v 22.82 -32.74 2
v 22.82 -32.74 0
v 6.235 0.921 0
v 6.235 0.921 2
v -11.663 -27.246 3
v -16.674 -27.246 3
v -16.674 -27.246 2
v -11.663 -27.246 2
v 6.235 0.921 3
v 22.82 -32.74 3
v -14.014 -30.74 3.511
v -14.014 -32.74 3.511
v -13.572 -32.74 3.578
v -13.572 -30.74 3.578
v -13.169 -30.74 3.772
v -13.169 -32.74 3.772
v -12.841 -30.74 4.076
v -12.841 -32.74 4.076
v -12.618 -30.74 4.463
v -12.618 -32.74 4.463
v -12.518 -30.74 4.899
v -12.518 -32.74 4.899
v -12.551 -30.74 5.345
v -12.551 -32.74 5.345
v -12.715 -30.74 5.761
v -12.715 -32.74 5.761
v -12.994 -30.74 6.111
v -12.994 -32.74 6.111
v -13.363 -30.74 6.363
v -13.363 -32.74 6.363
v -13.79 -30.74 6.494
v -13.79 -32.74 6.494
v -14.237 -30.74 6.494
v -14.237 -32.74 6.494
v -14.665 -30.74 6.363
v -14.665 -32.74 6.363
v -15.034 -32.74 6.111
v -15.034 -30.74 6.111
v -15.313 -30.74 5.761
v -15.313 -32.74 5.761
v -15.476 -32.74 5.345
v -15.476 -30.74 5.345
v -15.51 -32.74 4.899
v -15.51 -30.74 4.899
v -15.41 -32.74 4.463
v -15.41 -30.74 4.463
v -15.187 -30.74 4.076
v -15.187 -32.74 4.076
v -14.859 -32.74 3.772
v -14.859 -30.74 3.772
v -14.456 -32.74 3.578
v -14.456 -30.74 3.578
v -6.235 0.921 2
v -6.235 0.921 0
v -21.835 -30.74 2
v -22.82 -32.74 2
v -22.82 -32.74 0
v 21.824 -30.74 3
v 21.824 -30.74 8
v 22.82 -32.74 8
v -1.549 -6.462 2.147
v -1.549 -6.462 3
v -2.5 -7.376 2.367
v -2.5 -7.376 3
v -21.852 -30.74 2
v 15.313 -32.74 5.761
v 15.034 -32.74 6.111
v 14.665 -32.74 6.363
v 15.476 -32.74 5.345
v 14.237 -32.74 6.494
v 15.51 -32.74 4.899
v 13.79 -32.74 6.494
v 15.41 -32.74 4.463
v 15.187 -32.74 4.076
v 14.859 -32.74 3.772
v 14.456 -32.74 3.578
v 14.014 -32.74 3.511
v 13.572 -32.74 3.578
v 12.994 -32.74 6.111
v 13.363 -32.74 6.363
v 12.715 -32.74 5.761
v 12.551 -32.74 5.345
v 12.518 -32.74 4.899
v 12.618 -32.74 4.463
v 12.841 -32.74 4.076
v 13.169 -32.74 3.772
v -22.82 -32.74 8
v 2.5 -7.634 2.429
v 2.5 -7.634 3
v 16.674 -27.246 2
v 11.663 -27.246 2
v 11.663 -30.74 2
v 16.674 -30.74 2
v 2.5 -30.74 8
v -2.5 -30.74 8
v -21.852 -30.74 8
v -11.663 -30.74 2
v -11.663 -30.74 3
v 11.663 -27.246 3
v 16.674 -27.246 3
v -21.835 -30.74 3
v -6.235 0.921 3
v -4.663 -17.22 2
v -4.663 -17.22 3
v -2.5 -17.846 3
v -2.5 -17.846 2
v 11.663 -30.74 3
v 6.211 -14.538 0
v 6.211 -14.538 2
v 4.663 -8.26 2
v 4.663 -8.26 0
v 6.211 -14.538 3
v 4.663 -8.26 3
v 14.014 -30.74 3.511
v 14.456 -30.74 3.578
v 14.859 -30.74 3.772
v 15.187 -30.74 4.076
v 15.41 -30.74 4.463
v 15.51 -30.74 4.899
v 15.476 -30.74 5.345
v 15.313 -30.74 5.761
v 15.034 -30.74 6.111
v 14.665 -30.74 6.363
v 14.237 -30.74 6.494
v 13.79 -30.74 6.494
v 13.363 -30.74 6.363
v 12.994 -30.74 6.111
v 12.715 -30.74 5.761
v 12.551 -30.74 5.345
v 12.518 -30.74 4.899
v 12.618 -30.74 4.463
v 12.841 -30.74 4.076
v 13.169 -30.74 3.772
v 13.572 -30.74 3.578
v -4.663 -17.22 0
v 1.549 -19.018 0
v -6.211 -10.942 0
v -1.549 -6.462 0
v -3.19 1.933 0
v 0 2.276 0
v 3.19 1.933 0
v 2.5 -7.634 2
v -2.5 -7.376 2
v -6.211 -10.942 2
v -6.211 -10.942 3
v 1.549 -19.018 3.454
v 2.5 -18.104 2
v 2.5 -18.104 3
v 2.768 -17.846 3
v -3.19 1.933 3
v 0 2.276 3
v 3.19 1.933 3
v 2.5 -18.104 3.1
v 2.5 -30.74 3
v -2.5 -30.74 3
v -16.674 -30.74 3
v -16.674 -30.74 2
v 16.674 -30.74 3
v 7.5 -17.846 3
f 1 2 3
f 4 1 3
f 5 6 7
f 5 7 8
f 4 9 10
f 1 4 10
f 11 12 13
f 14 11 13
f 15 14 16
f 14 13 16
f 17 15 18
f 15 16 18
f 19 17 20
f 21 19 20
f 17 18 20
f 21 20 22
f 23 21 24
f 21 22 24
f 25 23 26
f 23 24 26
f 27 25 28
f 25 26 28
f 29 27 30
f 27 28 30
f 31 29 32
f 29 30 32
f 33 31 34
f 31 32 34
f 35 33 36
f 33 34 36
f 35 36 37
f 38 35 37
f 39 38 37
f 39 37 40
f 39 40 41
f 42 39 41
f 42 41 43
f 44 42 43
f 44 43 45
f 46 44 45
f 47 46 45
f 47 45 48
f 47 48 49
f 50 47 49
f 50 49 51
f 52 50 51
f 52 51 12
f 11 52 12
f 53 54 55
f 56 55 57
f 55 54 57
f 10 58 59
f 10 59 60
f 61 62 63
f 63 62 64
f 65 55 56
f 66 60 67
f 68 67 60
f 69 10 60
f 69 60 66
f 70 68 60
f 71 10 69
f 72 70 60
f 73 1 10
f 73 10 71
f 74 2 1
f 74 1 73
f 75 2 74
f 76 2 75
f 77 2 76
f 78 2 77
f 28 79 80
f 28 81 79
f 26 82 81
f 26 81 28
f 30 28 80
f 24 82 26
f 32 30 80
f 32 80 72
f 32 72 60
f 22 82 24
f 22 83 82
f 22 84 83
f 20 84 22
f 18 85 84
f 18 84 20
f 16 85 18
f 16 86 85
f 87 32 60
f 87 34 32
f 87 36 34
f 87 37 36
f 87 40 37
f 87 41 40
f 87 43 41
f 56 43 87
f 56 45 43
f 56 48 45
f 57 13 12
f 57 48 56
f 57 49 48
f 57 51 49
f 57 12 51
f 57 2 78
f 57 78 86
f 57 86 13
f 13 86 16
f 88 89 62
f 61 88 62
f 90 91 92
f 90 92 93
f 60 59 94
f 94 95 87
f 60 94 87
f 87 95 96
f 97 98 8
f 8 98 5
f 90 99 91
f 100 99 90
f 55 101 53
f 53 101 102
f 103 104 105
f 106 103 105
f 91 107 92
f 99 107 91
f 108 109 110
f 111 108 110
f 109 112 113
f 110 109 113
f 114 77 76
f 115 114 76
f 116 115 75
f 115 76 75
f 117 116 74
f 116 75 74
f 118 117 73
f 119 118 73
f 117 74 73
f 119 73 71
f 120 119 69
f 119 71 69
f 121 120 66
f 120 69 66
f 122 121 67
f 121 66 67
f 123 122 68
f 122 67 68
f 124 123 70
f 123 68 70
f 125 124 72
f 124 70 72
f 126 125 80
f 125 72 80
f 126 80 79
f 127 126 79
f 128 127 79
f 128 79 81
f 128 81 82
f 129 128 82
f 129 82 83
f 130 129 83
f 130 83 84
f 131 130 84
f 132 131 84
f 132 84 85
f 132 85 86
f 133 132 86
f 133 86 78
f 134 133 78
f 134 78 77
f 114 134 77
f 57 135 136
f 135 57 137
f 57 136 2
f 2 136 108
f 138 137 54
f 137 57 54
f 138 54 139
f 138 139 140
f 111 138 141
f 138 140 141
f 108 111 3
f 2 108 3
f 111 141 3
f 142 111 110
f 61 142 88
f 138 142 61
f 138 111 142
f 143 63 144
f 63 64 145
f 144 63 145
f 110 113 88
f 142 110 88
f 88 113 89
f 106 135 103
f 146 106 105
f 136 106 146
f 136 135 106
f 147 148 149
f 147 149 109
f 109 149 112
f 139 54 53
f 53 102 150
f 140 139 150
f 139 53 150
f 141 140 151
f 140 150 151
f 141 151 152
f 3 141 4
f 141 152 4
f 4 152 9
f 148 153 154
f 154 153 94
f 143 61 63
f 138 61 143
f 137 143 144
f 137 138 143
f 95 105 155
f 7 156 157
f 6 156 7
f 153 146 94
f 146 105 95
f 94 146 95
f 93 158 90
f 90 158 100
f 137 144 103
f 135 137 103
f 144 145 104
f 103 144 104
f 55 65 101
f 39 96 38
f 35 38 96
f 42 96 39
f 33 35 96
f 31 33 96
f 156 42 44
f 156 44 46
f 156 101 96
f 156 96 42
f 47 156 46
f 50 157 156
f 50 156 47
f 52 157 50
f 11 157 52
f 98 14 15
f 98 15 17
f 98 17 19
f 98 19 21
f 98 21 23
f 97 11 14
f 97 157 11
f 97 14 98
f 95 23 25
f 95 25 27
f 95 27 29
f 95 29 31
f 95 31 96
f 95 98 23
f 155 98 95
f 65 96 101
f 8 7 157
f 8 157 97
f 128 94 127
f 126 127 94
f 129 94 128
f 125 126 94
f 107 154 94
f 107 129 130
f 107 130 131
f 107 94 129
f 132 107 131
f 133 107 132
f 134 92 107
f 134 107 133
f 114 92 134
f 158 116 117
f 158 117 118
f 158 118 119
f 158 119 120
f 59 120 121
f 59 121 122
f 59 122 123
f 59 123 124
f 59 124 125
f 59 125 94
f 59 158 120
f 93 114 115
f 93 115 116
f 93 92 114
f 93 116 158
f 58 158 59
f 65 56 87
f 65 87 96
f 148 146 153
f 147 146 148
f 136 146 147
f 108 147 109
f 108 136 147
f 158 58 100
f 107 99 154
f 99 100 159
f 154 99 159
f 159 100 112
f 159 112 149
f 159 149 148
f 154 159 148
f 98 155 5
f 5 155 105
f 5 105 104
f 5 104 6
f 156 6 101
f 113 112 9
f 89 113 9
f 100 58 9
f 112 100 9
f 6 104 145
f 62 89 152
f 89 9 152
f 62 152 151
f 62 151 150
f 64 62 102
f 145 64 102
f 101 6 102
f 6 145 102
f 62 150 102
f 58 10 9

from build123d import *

# Parameters (mm, degrees)
SKETCH_1_R               = 3
EXTRUDE_1_DEPTH          = 2
EXTRUDE_2_DEPTH          = 6
RIB_2_REACH              = 42.702
SKETCH_3_WALL_W          = 109.004825052
SKETCH_3_WALL_H          = 5
SKETCH_4_R               = 4.101413307
EXTRUDE_3_DEPTH          = 2
EXTRUDE_4_DEPTH          = 3
CUT_EXTRUDE_1_DEPTH      = 41.220101475
CUT_EXTRUDE_1_DEPTH_BACK = 41.220101475
CUT_EXTRUDE_START        = -10
CUT_EXTRUDE_2_DEPTH      = 10
CUT_EXTRUDE_3_DEPTH      = 10
SKETCH_14_R              = 1.5
CUT_EXTRUDE_4_DEPTH      = 10
SKETCH_15_W              = 5.01110436
SKETCH_15_H              = 3.494287521
CUT_EXTRUDE_5_DEPTH      = 1


with BuildPart() as part:
    # 草图1 → 凸台-拉伸1 (new body)
    with BuildSketch(Plane.XY):
        with BuildLine():
            Line((-5.382175267, 2.651827558), (-22.819924686, -32.74))
            Line((-22.819924686, -32.74), (22.819924686, -32.74))
            Line((22.819924686, -32.74), (5.382175267, 2.651827558))
            ThreePointArc((5.382175267, 2.651827558), (0, 6), (-5.382175267, 2.651827558))
        make_face()
        Circle(SKETCH_1_R, mode=Mode.SUBTRACT)
    extrude(amount=EXTRUDE_1_DEPTH)

    # 草图2 → 凸台-拉伸2 (add)
    with BuildSketch(Plane.XY.offset(2)):
        Polygon((21.824193002, -30.74), (22.819924686, -32.74), (-22.819924686, -32.74), (-21.851665672, -30.74), align=None)
    extrude(amount=EXTRUDE_2_DEPTH)

    # 草图3 wall → 筋2 (add, up to next)
    with BuildSketch(Plane(origin=(0, -18.296150966, 5), x_dir=(0, -0.972147881588, 0.234368292061), z_dir=(0, -0.234368292061, -0.972147881588)), mode=Mode.PRIVATE) as rib_2_sk1:
        Rectangle(SKETCH_3_WALL_W, SKETCH_3_WALL_H)
    rib_2_tool1 = extrude(rib_2_sk1.sketch, amount=RIB_2_REACH, mode=Mode.PRIVATE) - part.part
    add(rib_2_tool1.solids().sort_by_distance((0, -18.296150966, 5))[0])

    # 草图4 → 凸台-拉伸3 (add)
    with BuildSketch(Plane.XY.offset(2)):
        Circle(SKETCH_4_R)
    extrude(amount=-EXTRUDE_3_DEPTH)

    # 草图9 → 凸台-拉伸4 (add)
    with BuildSketch(Plane(origin=(0, 0, 0), x_dir=(-1, 0, 0), z_dir=(0, 0, -1))):
        with BuildLine():
            Line((-6.23517922, 0.920562354), (-22.819924686, -32.74))
            Line((-22.819924686, -32.74), (22.819924686, -32.74))
            Line((22.819924686, -32.74), (6.23517922, 0.920562354))
            ThreePointArc((6.23517922, 0.920562354), (0, 2.276271965), (-6.23517922, 0.920562354))
        make_face()
        Polygon((6.21139304, -10.94224311), (4.662599656, -17.220345721), (-1.548793384, -19.018102611), (-6.21139304, -14.53775689), (-4.662599656, -8.259654279), (1.548793384, -6.461897389), align=None, mode=Mode.SUBTRACT)
    extrude(amount=-EXTRUDE_4_DEPTH)

    # 草图11 → 切除-拉伸1 (cut, two sides: drawn at the far end of the back side and taken through both)
    with BuildSketch(Plane.XY.offset(3).offset(-CUT_EXTRUDE_1_DEPTH_BACK)):
        Polygon((6.21139304, -14.53775689), (4.662599656, -8.259654279), (-1.548793384, -6.461897389), (-6.21139304, -10.94224311), (-4.662599656, -17.220345721), (1.548793384, -19.018102611), align=None)
    extrude(amount=CUT_EXTRUDE_1_DEPTH + CUT_EXTRUDE_1_DEPTH_BACK, mode=Mode.SUBTRACT)

    # 草图12 → 切除-拉伸2 (cut)
    with BuildSketch(Plane.XY.offset(3).offset(CUT_EXTRUDE_START)):
        with BuildLine():
            Line((14.504971028, 2.702486536), (10.280667783, -1.794850678))
            ThreePointArc((10.280667783, -1.794850678), (0.290112641, 2.273469232), (-9.850153994, -1.405852921))
            Line((-9.850153994, -1.405852921), (-13.409584794, 3.662670837))
            ThreePointArc((-13.409584794, 3.662670837), (0.728324257, 8.43390183), (14.504971028, 2.702486536))
        make_face()
    extrude(amount=CUT_EXTRUDE_2_DEPTH, mode=Mode.SUBTRACT)

    # 草图13 → 切除-拉伸3 (cut)
    with BuildSketch(Plane.ZY.offset(2.5)):
        Polygon((3, -17.846264642), (8, -30.74), (8, -17.846264642), (3.4065387, -17.846264642), align=None)
    extrude(amount=-CUT_EXTRUDE_3_DEPTH, mode=Mode.SUBTRACT)

    # 草图14 → 切除-拉伸4 (cut)
    with BuildSketch(Plane.XZ.offset(32.74)):
        with Locations((14.013848445, 5.011131475)):
            Circle(SKETCH_14_R)
        with Locations((-14.013847957, 5.011131475)):
            Circle(SKETCH_14_R)
    extrude(amount=-CUT_EXTRUDE_4_DEPTH, mode=Mode.SUBTRACT)

    # 草图15 → 切除-拉伸5 (cut)
    with BuildSketch(Plane.XY.offset(3)):
        with Locations((-14.168501734, -28.99285624)):
            Rectangle(SKETCH_15_W, SKETCH_15_H)
        with Locations((14.168501734, -28.99285624)):
            Rectangle(SKETCH_15_W, SKETCH_15_H)
    extrude(amount=-CUT_EXTRUDE_5_DEPTH, mode=Mode.SUBTRACT)


solid = part.part
